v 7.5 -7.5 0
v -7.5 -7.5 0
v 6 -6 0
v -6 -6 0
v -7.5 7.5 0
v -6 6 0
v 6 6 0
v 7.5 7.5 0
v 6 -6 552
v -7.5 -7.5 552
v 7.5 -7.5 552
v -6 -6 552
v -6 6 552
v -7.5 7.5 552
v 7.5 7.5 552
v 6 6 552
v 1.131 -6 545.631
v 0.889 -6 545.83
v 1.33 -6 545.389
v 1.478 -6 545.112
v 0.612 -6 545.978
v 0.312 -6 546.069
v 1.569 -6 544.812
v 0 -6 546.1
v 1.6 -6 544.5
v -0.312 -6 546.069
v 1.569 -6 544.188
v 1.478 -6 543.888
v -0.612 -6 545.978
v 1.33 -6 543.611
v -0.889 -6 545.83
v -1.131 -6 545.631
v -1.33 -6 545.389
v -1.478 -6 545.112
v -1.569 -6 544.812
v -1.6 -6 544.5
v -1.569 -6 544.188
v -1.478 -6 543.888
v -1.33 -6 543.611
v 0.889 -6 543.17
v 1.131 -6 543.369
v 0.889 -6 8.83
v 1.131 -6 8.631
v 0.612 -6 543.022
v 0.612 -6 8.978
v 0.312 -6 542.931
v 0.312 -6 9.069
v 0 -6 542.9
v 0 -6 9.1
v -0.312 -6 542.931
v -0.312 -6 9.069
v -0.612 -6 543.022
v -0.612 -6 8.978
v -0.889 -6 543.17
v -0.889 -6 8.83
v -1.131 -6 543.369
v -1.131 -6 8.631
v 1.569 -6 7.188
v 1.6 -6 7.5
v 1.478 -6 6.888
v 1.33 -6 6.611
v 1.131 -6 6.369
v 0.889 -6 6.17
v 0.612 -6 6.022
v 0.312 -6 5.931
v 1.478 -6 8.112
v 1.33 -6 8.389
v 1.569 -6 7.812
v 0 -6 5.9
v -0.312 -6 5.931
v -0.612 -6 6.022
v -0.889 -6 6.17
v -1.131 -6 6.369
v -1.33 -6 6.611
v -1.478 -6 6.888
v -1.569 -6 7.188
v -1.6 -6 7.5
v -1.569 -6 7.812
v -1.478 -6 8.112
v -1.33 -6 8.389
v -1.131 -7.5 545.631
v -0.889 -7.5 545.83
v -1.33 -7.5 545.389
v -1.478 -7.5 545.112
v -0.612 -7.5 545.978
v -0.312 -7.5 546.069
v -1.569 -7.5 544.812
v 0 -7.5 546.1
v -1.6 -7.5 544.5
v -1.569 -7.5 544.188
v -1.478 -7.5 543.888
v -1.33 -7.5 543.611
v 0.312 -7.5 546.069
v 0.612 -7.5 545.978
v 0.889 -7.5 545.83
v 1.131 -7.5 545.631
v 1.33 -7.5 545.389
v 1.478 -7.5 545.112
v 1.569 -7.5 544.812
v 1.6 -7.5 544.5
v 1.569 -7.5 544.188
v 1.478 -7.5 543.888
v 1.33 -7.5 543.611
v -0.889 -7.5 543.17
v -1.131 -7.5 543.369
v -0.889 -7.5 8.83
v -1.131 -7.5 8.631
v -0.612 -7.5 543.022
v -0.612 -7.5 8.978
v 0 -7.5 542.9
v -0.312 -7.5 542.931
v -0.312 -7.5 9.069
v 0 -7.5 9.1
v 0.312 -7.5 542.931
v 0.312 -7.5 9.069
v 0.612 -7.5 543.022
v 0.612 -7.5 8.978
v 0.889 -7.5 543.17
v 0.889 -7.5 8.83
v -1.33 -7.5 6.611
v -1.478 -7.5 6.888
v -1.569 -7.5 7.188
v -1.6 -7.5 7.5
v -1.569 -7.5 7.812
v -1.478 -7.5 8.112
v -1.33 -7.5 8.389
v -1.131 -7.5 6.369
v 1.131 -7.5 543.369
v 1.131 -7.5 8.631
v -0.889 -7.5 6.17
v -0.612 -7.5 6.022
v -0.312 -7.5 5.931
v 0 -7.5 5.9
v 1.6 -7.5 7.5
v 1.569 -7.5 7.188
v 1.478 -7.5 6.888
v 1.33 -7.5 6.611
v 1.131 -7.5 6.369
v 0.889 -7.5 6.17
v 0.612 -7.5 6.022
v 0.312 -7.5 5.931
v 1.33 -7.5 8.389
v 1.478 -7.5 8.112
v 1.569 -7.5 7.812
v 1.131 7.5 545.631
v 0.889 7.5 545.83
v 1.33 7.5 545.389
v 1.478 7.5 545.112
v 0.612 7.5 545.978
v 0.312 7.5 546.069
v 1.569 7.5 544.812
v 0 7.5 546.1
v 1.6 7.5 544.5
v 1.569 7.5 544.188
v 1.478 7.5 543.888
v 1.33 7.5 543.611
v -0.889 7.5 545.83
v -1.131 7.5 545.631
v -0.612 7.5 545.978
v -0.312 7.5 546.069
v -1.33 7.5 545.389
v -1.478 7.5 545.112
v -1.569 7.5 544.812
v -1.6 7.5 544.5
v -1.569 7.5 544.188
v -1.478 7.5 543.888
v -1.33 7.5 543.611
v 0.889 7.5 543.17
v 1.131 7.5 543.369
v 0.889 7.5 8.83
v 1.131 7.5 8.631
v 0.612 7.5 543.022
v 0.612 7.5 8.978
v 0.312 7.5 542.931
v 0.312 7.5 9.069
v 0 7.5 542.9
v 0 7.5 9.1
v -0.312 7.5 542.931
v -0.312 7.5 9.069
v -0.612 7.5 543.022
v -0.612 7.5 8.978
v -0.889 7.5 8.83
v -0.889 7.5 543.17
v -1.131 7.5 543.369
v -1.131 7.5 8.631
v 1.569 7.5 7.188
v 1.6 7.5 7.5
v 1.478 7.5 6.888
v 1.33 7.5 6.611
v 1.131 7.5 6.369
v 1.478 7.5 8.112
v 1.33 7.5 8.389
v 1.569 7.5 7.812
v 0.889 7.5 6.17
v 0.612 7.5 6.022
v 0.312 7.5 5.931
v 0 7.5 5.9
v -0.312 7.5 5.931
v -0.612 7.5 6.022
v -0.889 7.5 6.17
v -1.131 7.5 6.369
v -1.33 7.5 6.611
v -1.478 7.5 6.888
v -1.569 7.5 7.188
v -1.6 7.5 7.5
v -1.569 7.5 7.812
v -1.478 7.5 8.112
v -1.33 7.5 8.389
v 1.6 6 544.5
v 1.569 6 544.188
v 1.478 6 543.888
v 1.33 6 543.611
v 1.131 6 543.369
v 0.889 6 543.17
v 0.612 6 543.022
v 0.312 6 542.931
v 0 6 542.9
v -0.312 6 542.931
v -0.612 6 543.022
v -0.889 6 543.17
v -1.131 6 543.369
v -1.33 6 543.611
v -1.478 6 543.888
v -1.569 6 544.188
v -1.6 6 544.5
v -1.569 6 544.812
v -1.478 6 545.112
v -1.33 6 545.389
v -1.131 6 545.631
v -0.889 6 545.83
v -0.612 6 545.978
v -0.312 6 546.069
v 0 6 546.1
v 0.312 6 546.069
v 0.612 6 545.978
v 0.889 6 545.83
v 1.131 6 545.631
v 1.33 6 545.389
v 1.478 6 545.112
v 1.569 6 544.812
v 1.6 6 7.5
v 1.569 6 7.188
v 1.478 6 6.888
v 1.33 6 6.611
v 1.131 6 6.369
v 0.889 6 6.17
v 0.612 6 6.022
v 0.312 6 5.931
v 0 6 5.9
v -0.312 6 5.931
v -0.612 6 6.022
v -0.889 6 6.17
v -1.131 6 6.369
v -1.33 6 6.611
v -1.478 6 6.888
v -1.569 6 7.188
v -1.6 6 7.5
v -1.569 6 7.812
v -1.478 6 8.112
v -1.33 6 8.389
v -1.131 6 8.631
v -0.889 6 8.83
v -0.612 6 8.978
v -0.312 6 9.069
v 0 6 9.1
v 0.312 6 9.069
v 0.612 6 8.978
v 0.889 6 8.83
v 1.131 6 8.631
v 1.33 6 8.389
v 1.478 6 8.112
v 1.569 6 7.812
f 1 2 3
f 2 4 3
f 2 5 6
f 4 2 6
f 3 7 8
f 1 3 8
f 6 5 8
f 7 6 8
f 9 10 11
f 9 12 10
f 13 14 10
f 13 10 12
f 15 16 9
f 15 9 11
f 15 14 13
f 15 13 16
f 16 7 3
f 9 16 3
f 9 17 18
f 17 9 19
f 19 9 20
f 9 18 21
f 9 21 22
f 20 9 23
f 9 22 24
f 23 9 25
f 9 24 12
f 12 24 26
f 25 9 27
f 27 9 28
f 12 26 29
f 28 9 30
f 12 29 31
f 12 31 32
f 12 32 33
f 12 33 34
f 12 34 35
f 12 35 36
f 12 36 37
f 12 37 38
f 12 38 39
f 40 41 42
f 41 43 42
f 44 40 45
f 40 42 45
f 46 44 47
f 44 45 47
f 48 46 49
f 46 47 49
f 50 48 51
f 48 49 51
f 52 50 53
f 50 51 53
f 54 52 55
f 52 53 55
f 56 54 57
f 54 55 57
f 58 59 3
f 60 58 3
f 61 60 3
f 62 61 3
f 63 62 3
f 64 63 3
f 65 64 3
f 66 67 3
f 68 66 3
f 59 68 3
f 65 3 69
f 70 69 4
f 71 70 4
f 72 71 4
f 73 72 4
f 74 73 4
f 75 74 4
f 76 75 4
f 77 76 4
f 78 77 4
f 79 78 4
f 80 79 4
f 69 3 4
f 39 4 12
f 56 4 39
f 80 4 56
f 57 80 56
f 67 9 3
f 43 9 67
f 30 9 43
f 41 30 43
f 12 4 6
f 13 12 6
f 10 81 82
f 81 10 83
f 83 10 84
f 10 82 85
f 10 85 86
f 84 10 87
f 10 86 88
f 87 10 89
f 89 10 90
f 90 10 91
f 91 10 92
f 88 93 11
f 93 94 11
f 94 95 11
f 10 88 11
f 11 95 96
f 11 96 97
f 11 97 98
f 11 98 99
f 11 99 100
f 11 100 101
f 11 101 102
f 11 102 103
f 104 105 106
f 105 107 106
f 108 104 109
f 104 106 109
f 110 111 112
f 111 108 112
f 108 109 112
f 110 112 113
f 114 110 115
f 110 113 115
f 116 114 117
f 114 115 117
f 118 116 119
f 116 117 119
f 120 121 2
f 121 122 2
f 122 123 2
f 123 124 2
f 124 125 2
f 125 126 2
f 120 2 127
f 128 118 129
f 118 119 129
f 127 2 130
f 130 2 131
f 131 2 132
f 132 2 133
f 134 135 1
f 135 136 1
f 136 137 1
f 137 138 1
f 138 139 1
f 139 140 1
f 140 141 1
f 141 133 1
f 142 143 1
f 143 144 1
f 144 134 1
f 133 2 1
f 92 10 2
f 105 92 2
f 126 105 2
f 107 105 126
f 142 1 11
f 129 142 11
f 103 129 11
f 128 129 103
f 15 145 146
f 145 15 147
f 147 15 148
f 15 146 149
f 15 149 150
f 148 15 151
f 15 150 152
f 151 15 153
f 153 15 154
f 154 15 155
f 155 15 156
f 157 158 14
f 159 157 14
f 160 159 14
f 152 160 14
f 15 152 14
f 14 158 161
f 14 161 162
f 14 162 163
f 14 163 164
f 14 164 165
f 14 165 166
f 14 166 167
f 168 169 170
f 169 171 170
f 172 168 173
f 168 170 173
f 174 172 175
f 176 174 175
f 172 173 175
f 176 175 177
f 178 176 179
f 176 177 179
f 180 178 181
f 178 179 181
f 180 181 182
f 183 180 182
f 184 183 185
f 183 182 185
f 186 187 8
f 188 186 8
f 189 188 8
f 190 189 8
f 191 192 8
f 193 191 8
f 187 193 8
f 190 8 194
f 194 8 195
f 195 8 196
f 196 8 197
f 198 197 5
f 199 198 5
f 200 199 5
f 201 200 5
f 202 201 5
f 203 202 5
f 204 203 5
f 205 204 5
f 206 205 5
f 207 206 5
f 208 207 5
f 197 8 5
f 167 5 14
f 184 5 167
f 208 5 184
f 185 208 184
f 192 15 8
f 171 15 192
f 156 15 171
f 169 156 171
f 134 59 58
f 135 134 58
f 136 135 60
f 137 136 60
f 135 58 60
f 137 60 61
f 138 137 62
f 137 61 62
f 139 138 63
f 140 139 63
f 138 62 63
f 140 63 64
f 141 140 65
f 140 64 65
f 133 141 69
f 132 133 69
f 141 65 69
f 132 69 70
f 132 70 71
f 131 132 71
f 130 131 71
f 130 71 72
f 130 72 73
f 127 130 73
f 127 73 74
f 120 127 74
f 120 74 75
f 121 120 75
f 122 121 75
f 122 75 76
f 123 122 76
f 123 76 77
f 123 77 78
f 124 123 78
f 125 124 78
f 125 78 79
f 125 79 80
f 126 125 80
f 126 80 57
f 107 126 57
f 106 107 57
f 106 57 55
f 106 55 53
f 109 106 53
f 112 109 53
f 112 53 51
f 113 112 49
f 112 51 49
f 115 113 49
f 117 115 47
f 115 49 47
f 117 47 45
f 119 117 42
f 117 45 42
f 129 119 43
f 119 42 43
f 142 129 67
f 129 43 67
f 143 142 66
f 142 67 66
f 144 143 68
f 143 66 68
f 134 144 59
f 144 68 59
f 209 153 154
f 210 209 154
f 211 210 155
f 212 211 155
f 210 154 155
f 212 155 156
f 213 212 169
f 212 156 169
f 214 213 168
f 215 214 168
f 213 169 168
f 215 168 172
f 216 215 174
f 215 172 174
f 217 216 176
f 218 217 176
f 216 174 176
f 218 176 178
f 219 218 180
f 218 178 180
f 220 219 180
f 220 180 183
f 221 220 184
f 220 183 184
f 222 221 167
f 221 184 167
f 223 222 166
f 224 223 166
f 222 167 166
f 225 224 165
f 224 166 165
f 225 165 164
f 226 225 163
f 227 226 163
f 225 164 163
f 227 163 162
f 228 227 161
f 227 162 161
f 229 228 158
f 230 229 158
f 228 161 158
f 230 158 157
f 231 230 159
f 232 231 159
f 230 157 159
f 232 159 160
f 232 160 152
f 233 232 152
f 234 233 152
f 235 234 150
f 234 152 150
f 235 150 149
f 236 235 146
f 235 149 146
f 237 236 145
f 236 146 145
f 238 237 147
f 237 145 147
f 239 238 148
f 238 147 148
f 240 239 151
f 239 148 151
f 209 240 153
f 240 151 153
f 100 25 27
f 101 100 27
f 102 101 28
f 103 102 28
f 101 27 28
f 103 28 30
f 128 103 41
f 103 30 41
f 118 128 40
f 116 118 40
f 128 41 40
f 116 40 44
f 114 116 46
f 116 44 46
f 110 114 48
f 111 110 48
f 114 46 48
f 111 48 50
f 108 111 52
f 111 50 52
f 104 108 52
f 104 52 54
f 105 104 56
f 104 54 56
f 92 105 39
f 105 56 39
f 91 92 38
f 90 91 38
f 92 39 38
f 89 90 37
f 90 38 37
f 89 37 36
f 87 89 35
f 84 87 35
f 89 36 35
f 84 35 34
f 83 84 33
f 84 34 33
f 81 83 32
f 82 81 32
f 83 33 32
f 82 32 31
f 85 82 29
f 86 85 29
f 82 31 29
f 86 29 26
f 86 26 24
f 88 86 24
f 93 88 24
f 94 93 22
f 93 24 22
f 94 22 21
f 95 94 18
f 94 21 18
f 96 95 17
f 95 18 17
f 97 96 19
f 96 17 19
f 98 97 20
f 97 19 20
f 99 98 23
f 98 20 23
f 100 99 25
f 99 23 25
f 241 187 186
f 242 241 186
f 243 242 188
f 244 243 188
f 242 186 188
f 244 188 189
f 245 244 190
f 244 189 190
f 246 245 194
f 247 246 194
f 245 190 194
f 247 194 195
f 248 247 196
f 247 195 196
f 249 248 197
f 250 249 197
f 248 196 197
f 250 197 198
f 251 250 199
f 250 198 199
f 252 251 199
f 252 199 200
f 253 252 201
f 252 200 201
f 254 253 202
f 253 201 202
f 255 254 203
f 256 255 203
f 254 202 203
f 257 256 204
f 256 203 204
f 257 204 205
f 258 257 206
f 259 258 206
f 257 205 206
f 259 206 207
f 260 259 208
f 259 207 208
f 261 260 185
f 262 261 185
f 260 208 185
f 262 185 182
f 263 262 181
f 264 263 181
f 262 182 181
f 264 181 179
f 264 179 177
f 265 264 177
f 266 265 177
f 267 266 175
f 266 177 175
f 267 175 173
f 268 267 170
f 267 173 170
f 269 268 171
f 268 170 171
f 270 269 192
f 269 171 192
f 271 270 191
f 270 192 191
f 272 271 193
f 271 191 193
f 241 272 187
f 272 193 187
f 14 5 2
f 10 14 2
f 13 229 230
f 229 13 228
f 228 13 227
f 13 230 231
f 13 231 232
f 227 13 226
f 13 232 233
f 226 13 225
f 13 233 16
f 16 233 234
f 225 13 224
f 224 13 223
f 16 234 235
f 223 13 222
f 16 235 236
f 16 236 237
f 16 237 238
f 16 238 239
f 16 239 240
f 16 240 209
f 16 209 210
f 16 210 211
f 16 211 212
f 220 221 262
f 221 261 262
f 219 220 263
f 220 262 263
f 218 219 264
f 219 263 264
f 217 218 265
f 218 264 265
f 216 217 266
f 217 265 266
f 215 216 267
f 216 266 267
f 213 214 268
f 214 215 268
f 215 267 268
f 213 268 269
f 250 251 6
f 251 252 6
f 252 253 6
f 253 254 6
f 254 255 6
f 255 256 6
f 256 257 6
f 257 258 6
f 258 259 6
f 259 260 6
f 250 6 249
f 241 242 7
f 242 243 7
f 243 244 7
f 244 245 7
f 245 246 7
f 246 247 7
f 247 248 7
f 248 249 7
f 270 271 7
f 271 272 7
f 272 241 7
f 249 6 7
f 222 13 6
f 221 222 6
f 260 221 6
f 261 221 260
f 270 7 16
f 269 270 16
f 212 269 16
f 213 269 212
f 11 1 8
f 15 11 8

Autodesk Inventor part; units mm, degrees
ref_plane "YZ Plane" through (0, 0, 0) normal (1, 0, 0) x (0, 1, 0)
ref_plane "XZ Plane" through (0, 0, 0) normal (0, 1, 0) x (-1, 0, 0)
ref_plane "XY Plane" through (0, 0, 0) normal (0, 0, 1) x (1, 0, 0)
sketch "スケッチ1" plane through (0, 0, 0) normal (0, 0, 1) x (1, 0, 0)
  line L0 (7.5, 7.5) -> (-7.5, 7.5)
  line L1 (-7.5, 7.5) -> (-7.5, -7.5)
  line L2 (-7.5, -7.5) -> (7.5, -7.5)
  line L3 (7.5, -7.5) -> (7.5, 7.5)
  line L4 (7.5, 7.5) -> (-7.5, -7.5) construction
  line L5 (-7.5, 7.5) -> (7.5, -7.5) construction
  line L6 (-6, 6) -> (6, 6)
  line L7 (6, 6) -> (6, -6)
  line L8 (6, -6) -> (-6, -6)
  line L9 (-6, -6) -> (-6, 6)
  point P0 (0, 0)
  dimension "d0" = 15
  dimension "d1" = 15
  dimension "d2" = 1.5
extrude "押し出し1" add sketch "スケッチ1" along normal blind 552
sketch "スケッチ2" plane through (-7.5, 7.5, 0) normal (0, 1, 0) x (1, 0, 0)
  circle A0 centre (7.5, -7.5) radius 1.6
  line L0 (15, 0) -> (0, 0) projected
  circle A1 centre (7.5, -544.5) radius 1.6
  line L1 (15, -552) -> (0, -552) projected
  point P0 (7.5, 0)
  point P1 (7.5, 0)
  point P2 (7.5, -552)
  dimension "d5" = 3.2
  dimension "d6" = 7.5
  dimension "d7" = 3.2
  dimension "d8" = 7.5
extrude "押し出し2" cut sketch "スケッチ2" against normal through all
properties part number "上下機構_角柱5" material "アルミニウム 6061"
